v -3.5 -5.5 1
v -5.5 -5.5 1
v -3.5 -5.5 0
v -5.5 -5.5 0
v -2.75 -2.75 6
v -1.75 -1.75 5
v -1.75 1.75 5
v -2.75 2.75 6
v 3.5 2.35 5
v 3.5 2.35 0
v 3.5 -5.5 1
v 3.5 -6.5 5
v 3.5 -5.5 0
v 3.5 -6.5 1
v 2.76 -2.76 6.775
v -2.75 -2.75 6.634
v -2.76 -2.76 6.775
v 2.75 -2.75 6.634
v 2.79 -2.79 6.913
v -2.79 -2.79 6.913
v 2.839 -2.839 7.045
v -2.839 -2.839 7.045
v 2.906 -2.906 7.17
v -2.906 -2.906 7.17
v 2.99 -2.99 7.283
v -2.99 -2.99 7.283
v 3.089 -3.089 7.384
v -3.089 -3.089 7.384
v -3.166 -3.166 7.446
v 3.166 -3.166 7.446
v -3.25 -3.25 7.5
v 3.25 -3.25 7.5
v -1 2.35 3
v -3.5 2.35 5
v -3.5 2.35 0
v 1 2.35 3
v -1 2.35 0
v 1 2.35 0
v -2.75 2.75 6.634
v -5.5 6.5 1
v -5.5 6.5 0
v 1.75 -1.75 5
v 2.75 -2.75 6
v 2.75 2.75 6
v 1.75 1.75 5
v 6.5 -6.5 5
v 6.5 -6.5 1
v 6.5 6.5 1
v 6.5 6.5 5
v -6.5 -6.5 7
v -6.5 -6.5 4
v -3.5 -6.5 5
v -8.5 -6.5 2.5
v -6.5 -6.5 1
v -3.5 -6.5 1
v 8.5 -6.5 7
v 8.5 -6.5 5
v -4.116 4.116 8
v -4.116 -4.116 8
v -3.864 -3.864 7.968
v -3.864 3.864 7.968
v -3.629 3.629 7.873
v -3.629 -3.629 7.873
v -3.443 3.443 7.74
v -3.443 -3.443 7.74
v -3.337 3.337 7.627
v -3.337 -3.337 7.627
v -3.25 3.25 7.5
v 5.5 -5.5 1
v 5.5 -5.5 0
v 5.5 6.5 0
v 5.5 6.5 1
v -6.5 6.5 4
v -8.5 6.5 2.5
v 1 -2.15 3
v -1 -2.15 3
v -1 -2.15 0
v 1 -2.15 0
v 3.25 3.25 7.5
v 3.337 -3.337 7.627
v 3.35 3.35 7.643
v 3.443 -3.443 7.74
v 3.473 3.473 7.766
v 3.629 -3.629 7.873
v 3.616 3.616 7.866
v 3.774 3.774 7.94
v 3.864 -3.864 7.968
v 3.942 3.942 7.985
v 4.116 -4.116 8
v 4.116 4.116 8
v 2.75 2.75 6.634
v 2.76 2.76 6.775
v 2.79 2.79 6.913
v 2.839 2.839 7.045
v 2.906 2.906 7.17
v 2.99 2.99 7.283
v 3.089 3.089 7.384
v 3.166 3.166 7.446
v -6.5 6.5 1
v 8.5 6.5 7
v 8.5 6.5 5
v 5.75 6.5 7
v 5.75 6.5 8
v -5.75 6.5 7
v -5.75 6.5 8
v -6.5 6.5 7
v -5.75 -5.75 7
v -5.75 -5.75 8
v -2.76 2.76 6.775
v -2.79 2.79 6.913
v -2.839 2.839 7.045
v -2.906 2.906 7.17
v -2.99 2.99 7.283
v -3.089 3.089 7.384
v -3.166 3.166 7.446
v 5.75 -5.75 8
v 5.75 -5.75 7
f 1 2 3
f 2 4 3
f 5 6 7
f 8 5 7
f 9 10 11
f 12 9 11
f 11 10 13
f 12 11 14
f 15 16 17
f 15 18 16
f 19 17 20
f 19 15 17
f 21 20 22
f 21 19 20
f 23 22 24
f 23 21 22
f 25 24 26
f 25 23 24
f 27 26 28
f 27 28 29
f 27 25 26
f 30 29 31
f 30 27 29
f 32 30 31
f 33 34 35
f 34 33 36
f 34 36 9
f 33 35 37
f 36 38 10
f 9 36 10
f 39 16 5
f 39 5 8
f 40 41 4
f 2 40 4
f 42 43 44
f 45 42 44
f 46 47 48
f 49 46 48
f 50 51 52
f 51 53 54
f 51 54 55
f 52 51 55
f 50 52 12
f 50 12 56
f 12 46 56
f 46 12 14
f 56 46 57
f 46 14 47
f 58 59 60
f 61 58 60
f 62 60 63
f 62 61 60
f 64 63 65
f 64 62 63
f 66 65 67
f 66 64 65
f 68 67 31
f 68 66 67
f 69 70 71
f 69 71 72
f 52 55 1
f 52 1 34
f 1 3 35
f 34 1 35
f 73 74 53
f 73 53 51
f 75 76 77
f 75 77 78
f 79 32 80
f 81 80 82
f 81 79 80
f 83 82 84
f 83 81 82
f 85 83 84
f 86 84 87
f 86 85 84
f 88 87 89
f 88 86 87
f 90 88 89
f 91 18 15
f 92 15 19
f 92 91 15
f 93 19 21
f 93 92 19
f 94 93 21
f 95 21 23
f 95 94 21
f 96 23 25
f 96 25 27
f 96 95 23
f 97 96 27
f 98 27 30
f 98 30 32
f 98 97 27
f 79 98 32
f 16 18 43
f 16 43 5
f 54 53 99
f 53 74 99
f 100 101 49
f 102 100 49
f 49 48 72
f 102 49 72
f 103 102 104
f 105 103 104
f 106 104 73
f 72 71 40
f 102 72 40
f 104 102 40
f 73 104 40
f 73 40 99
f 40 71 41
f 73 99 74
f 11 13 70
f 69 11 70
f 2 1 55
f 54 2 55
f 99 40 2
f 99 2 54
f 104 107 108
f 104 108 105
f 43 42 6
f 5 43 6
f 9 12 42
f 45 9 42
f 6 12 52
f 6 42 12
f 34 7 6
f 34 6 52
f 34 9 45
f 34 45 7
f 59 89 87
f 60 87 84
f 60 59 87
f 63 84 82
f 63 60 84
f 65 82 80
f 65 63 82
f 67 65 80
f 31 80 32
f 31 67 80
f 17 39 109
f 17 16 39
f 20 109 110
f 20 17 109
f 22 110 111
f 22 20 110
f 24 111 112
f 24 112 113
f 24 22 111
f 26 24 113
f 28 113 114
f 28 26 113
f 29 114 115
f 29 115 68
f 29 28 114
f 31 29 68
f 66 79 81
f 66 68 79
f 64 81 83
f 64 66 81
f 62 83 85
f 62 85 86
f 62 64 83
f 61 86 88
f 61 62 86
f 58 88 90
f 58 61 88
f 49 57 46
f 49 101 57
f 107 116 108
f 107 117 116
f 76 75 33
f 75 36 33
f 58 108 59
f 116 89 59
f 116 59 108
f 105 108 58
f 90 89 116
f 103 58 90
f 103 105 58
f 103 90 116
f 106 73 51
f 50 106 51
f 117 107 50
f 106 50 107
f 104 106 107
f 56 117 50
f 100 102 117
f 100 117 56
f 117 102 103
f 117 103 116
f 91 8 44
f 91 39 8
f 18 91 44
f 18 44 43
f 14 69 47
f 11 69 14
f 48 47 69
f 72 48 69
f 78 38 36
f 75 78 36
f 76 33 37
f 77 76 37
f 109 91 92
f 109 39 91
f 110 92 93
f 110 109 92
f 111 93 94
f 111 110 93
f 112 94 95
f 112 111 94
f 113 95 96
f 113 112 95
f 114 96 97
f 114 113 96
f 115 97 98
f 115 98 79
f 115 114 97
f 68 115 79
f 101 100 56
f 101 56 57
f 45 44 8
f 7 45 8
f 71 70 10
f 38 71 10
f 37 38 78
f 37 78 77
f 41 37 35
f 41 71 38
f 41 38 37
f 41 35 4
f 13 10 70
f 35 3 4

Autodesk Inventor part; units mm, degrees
ref_plane "YZ Plane" through (0, 0, 0) normal (1, 0, 0) x (0, 1, 0)
ref_plane "XZ Plane" through (0, 0, 0) normal (0, 1, 0) x (-1, 0, 0)
ref_plane "XY Plane" through (0, 0, 0) normal (0, 0, 1) x (1, 0, 0)
sketch "Sketch1" plane through (0, 0, 0) normal (0, 0, 1) x (1, 0, 0)
  line L0 (-6.5, -6.5) -> (6.5, -6.5)
  line L1 (6.5, -6.5) -> (6.5, 6.5)
  line L2 (6.5, 6.5) -> (-6.5, 6.5)
  line L3 (-6.5, 6.5) -> (-6.5, -6.5)
  line L4 (-6.5, -6.5) -> (6.5, 6.5) construction
  line L5 (6.5, -6.5) -> (-6.5, 6.5) construction
  line L6 (-5.75, -5.75) -> (5.75, -5.75)
  line L7 (5.75, -5.75) -> (5.75, 5.75)
  line L8 (5.75, 5.75) -> (-5.75, 5.75)
  line L9 (-5.75, 5.75) -> (-5.75, -5.75)
  point P0 (0, 0)
  dimension "d0" = 13
  dimension "d1" = 13
  dimension "d2" = 0.75
extrude "Extrusion1" add sketch "Sketch1" along normal blind 7.5 contours L9 L8 L7 L6
extrude "Extrusion2" add sketch "Sketch1" along normal blind 7
sketch "Sketch2" plane through (0, 0, 7.5) normal (0, 0, 1) x (1, 0, 0)
  line L0 (5.75, 5.75) -> (-5.75, 5.75) projected
  line L1 (-5.75, -5.75) -> (5.75, -5.75)
  line L2 (5.75, -5.75) -> (5.75, 5.75)
  line L3 (5.75, 5.75) -> (-5.75, 5.75)
  line L4 (-5.75, 5.75) -> (-5.75, -5.75)
  line L5 (-5.75, -5.75) -> (5.75, 5.75) construction
  line L6 (5.75, -5.75) -> (-5.75, 5.75) construction
  line L7 (-3.75, -3.75) -> (3.75, -3.75)
  line L8 (3.75, -3.75) -> (3.75, 3.75)
  line L9 (3.75, 3.75) -> (-3.75, 3.75)
  line L10 (-3.75, 3.75) -> (-3.75, -3.75)
  line L11 (-4.75, 4.75) -> (4.75, 4.75)
  line L12 (4.75, 4.75) -> (4.75, -4.75)
  line L13 (4.75, -4.75) -> (-4.75, -4.75)
  line L14 (-4.75, -4.75) -> (-4.75, 4.75)
  line L15 (-2.75, 2.75) -> (2.75, 2.75)
  line L16 (2.75, 2.75) -> (2.75, -2.75)
  line L17 (2.75, -2.75) -> (-2.75, -2.75)
  line L18 (-2.75, -2.75) -> (-2.75, 2.75)
  point P0 (0, 0)
  dimension "d7" = 2
  dimension "d10" = 1
  dimension "d14" = 1
extrude "Extrusion3" cut sketch "Sketch2" against normal through all contours L15 L16 L17 L18
sketch "Sketch6" plane through (0, 0, 0) normal (0, 0, -1) x (-1, 0, 0)
  line L0 (2.75, -2.75) -> (2.75, 2.75) projected
  line L1 (-2.75, -2.75) -> (2.75, -2.75)
  line L2 (2.75, -2.75) -> (2.75, 2.75)
  line L3 (2.75, 2.75) -> (-2.75, 2.75)
  line L4 (-2.75, 2.75) -> (-2.75, -2.75)
  line L5 (-2.75, -2.75) -> (2.75, 2.75) construction
  line L6 (2.75, -2.75) -> (-2.75, 2.75) construction
  line L7 (-3.75, 3.75) -> (3.75, 3.75)
  line L8 (3.75, 3.75) -> (3.75, -3.75)
  line L9 (3.75, -3.75) -> (-3.75, -3.75)
  line L10 (-3.75, -3.75) -> (-3.75, 3.75)
  line L11 (6.5, -6.5) -> (-6.5, -6.5) projected
  line L12 (-3.75, -3.75) -> (3.75, -3.75)
  line L13 (3.75, -3.75) -> (3.75, -6.5)
  line L14 (3.75, -6.5) -> (-3.75, -6.5)
  line L15 (-3.75, -6.5) -> (-3.75, -3.75)
  line L16 (-1.75, 1.75) -> (1.75, 1.75)
  line L17 (1.75, 1.75) -> (1.75, -1.75)
  line L18 (1.75, -1.75) -> (-1.75, -1.75)
  line L19 (-1.75, -1.75) -> (-1.75, 1.75)
  point P0 (0, 0)
  dimension "d25" = 1
  dimension "d36" = 1
extrude "Extrusion9" add sketch "Sketch6" against normal blind 6 contours L1 L4 L3 L0
sketch "Sketch7" plane through (0, 0, 0) normal (0, 0, -1) x (-1, 0, 0)
  line L0 (6.5, -6.5) -> (-6.5, -6.5) projected
  line L1 (-3.5, -6.5) -> (3.5, -6.5)
  line L2 (3.5, -6.5) -> (3.5, 2.35)
  line L3 (3.5, 2.35) -> (-3.5, 2.35)
  line L4 (-3.5, 2.35) -> (-3.5, -6.5)
  line L5 (-6.5, -6.5) -> (-6.5, 6.5) projected
  line L6 (6.5, 6.5) -> (6.5, -6.5) projected
  line L7 (-1.75, 1.75) -> (1.75, 1.75) projected
  point P0 (0, 0)
  dimension "d47" = 3
  dimension "d48" = 3
  dimension "d49" = 0.6
extrude "Extrusion10" cut sketch "Sketch7" against normal blind 5
chamfer "Chamfer5" distance 1 angle 45 4 edges at (-1.75, 0, 6) (0, -1.75, 6) (1.75, 0, 6) (0, 1.75, 6)
sketch "Sketch8" plane through (0, 0, 5) normal (0, 0, -1) x (-1, 0, 0)
  point P0 (0, 0)
sketch "Sketch9" plane through (0, 0, 0) normal (0, 0, -1) x (-1, 0, 0)
  line L0 (-6.5, 6.5) -> (6.5, 6.5) projected
  line L1 (6.5, 6.5) -> (6.5, -6.5) projected
  line L2 (-6.5, 6.5) -> (6.5, 6.5)
  line L3 (6.5, 6.5) -> (6.5, -6.5)
  line L4 (6.5, -6.5) -> (-6.5, -6.5)
  line L5 (-6.5, -6.5) -> (-6.5, 6.5)
  line L6 (-5.5, 5.5) -> (5.5, 5.5)
  line L7 (5.5, 5.5) -> (5.5, -5.5)
  line L8 (5.5, -5.5) -> (-5.5, -5.5)
  line L9 (-5.5, -5.5) -> (-5.5, 5.5)
  point P0 (0, 0)
  dimension "d50" = 1
extrude "Extrusion11" cut sketch "Sketch9" against normal blind 1
sketch "Sketch10" plane through (-3.5, 2.35, 0) normal (0, -1, 0) x (1, 0, 0)
  line L0 (-2, 0) -> (9, 0) projected
  line L1 (4.5, 3) -> (2.5, 3)
  line L2 (2.5, 3) -> (2.5, 0)
  line L3 (2.5, 0) -> (4.5, 0)
  line L4 (4.5, 0) -> (4.5, 3)
  point P0 (3.5, 0)
  point P1 (3.5, 0)
  point P2 (4.5, 0)
  dimension "d53" = 3
  dimension "d54" = 2
  dimension "d55" = 1
extrude "Extrusion12" add sketch "Sketch10" along normal blind 4.5
sketch "Sketch11" plane through (-6.5, 6.5, 7) normal (0, 1, 0) x (1, 0, 0)
  line L0 (13, 6) -> (13, 0) projected
  line L1 (13, 0) -> (15, 0)
  line L2 (15, 0) -> (15, 2)
  line L3 (15, 2) -> (13, 2)
  line L4 (13, 2) -> (13, 0)
  line L5 (0, 6) -> (0, 0) projected
  line L6 (0, 6) -> (0, 3)
  line L7 (0, 4.5) -> (-2, 4.5)
  line L8 (-2, 4.5) -> (0, 3)
  line L9 (-2, 4.5) -> (0, 6)
  point P0 (6.5, 7)
  point P1 (13, 2)
  dimension "d58" = 2
  dimension "d59" = 2
  dimension "d60" = 2
extrude "Extrusion13" add sketch "Sketch11" against normal blind 13
sketch "Sketch12" plane through (-5.5, 5.5, 0) normal (0, 1, 0) x (1, 0, 0)
  line L0 (0, 0) -> (11, 0)
  line L1 (11, 0) -> (11, -7.4478)
  line L2 (11, -7.4478) -> (0, -7.4478)
  line L3 (0, -7.4478) -> (0, 0)
  line L4 (-0.25, -7.5) -> (11.25, -7.5) projected
  line L5 (0, 0) -> (11, 0)
  line L6 (11, 0) -> (11, -7.5)
  line L7 (11, -7.5) -> (0, -7.5)
  line L8 (0, -7.5) -> (0, 0)
  point P0 (5.5, 0)
extrude "Extrusion14" add sketch "Sketch12" along normal blind 1
sketch "Sketch13" plane through (0, 0, 7.5) normal (0, 0, 1) x (1, 0, 0)
  line L0 (5.75, 5.75) -> (5.5, 5.75) projected
  line L1 (-5.5, 6.5) -> (-5.5, -5.5) projected
  line L2 (5.5, 5.75) -> (-5.5, 5.75)
  line L3 (-5.5, 5.75) -> (-5.5, -5.5)
  line L4 (-5.5, -5.5) -> (5.5, -5.5)
  line L5 (5.5, -5.5) -> (5.5, 5.75)
  line L6 (5.75, -5.75) -> (-5.75, -5.75)
  line L7 (-5.75, -5.75) -> (-5.75, 6)
  line L8 (-5.75, 6) -> (5.75, 6)
  line L9 (5.75, 6) -> (5.75, -5.75)
  point P0 (0, 0)
  point P1 (-5.5, 6)
extrude "Extrusion15" cut sketch "Sketch13" against normal blind 0.5 contours L9 L6 L7 L8 L1 L4 L5 L0
sketch "Sketch14" plane through (0, 0, 7.5) normal (0, 0, 1) x (1, 0, 0)
  line L0 (5.5, 6.5) -> (-5.5, 6.5) projected
  line L1 (-5.5, 6.5) -> (5.5, 6.5)
  line L2 (5.5, 6.5) -> (5.5, -5.5)
  line L3 (5.5, -5.5) -> (-5.5, -5.5)
  line L4 (-5.5, -5.5) -> (-5.5, 6.5)
  line L5 (-3.25, 3.25) -> (-3.25, -3.25) projected
  line L6 (-3.25, -3.25) -> (3.25, -3.25) projected
  line L7 (-3.25, 3.25) -> (3.25, 3.25)
  line L8 (3.25, 3.25) -> (3.25, -3.25)
  line L9 (3.25, -3.25) -> (-3.25, -3.25)
  line L10 (-3.25, -3.25) -> (-3.25, 3.25)
  point P0 (0, 0)
extrude "Extrusion16" add sketch "Sketch14" along normal blind 0.5
sketch "Sketch15" plane through (0, 0, 7) normal (0, 0, 1) x (1, 0, 0)
  line L0 (5.5, 6.5) -> (5.5, -5.5) projected
  line L1 (5.5, 6.5) -> (-5.5, 6.5)
  line L2 (-5.5, 6.5) -> (-5.5, -5.5)
  line L3 (-5.5, -5.5) -> (5.5, -5.5)
  line L4 (5.5, -5.5) -> (5.5, 6.5)
  line L5 (5.75, -5.75) -> (-5.75, -5.75)
  line L6 (-5.75, -5.75) -> (-5.75, 6.75)
  line L7 (-5.75, 6.75) -> (5.75, 6.75)
  line L8 (5.75, 6.75) -> (5.75, -5.75)
  line L9 (5.75, 6.5) -> (-5.75, 6.5)
  point P0 (0, 0)
  dimension "d69" = 0.25
extrude "Extrusion17" add sketch "Sketch15" along normal blind 1 contours L9 L8 L5 L6 L2 L3 L0
fillet "Fillet1" radius 1 8 edges at (0, 2.75, 7.5) (2.75, 0, 7.5) (-2.75, 0, 7.5) (0, -2.75, 7.5) (0, 3.25, 8) (-3.25, 0, 8) (0, -3.25, 8) (3.25, 0, 8)
properties part number "NV_module" material "PET Plastic"
